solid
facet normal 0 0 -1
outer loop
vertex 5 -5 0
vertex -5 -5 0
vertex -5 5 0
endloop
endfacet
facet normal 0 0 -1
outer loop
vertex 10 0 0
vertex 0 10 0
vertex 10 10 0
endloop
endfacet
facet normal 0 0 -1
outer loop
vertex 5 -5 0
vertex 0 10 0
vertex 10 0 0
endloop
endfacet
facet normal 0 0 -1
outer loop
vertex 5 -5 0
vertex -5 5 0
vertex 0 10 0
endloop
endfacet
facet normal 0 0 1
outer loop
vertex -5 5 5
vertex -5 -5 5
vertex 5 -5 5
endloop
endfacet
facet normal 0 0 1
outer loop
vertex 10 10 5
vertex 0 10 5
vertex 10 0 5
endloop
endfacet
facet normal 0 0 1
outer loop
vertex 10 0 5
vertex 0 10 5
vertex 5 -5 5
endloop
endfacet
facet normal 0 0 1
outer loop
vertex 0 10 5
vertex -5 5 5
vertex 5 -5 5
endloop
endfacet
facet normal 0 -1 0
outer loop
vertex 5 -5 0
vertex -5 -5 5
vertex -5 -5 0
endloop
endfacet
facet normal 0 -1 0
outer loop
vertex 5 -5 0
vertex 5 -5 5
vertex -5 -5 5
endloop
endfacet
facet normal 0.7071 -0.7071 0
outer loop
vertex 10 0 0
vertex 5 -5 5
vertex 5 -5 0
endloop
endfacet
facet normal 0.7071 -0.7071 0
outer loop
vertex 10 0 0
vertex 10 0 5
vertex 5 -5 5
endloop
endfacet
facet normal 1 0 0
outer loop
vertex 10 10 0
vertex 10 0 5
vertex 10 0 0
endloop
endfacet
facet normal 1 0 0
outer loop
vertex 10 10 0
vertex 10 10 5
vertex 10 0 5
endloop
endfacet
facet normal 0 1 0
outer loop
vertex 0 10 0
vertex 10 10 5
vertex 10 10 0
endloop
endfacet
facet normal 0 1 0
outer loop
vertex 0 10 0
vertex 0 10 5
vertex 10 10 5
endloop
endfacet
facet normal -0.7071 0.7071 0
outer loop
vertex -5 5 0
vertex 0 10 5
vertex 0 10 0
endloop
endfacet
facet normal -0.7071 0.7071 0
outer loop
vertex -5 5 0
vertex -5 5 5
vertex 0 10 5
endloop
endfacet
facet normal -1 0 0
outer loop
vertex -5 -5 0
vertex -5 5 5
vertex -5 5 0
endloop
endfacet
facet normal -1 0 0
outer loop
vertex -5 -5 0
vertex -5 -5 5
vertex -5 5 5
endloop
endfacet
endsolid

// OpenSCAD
linear_extrude(height=5)
hull() 
union() {
    difference() {
        square(10);
        translate([-.1, -.1]) square(9);
    }
    difference() {
        square(10, center=true);
        square(8, center=true);
    }
}
